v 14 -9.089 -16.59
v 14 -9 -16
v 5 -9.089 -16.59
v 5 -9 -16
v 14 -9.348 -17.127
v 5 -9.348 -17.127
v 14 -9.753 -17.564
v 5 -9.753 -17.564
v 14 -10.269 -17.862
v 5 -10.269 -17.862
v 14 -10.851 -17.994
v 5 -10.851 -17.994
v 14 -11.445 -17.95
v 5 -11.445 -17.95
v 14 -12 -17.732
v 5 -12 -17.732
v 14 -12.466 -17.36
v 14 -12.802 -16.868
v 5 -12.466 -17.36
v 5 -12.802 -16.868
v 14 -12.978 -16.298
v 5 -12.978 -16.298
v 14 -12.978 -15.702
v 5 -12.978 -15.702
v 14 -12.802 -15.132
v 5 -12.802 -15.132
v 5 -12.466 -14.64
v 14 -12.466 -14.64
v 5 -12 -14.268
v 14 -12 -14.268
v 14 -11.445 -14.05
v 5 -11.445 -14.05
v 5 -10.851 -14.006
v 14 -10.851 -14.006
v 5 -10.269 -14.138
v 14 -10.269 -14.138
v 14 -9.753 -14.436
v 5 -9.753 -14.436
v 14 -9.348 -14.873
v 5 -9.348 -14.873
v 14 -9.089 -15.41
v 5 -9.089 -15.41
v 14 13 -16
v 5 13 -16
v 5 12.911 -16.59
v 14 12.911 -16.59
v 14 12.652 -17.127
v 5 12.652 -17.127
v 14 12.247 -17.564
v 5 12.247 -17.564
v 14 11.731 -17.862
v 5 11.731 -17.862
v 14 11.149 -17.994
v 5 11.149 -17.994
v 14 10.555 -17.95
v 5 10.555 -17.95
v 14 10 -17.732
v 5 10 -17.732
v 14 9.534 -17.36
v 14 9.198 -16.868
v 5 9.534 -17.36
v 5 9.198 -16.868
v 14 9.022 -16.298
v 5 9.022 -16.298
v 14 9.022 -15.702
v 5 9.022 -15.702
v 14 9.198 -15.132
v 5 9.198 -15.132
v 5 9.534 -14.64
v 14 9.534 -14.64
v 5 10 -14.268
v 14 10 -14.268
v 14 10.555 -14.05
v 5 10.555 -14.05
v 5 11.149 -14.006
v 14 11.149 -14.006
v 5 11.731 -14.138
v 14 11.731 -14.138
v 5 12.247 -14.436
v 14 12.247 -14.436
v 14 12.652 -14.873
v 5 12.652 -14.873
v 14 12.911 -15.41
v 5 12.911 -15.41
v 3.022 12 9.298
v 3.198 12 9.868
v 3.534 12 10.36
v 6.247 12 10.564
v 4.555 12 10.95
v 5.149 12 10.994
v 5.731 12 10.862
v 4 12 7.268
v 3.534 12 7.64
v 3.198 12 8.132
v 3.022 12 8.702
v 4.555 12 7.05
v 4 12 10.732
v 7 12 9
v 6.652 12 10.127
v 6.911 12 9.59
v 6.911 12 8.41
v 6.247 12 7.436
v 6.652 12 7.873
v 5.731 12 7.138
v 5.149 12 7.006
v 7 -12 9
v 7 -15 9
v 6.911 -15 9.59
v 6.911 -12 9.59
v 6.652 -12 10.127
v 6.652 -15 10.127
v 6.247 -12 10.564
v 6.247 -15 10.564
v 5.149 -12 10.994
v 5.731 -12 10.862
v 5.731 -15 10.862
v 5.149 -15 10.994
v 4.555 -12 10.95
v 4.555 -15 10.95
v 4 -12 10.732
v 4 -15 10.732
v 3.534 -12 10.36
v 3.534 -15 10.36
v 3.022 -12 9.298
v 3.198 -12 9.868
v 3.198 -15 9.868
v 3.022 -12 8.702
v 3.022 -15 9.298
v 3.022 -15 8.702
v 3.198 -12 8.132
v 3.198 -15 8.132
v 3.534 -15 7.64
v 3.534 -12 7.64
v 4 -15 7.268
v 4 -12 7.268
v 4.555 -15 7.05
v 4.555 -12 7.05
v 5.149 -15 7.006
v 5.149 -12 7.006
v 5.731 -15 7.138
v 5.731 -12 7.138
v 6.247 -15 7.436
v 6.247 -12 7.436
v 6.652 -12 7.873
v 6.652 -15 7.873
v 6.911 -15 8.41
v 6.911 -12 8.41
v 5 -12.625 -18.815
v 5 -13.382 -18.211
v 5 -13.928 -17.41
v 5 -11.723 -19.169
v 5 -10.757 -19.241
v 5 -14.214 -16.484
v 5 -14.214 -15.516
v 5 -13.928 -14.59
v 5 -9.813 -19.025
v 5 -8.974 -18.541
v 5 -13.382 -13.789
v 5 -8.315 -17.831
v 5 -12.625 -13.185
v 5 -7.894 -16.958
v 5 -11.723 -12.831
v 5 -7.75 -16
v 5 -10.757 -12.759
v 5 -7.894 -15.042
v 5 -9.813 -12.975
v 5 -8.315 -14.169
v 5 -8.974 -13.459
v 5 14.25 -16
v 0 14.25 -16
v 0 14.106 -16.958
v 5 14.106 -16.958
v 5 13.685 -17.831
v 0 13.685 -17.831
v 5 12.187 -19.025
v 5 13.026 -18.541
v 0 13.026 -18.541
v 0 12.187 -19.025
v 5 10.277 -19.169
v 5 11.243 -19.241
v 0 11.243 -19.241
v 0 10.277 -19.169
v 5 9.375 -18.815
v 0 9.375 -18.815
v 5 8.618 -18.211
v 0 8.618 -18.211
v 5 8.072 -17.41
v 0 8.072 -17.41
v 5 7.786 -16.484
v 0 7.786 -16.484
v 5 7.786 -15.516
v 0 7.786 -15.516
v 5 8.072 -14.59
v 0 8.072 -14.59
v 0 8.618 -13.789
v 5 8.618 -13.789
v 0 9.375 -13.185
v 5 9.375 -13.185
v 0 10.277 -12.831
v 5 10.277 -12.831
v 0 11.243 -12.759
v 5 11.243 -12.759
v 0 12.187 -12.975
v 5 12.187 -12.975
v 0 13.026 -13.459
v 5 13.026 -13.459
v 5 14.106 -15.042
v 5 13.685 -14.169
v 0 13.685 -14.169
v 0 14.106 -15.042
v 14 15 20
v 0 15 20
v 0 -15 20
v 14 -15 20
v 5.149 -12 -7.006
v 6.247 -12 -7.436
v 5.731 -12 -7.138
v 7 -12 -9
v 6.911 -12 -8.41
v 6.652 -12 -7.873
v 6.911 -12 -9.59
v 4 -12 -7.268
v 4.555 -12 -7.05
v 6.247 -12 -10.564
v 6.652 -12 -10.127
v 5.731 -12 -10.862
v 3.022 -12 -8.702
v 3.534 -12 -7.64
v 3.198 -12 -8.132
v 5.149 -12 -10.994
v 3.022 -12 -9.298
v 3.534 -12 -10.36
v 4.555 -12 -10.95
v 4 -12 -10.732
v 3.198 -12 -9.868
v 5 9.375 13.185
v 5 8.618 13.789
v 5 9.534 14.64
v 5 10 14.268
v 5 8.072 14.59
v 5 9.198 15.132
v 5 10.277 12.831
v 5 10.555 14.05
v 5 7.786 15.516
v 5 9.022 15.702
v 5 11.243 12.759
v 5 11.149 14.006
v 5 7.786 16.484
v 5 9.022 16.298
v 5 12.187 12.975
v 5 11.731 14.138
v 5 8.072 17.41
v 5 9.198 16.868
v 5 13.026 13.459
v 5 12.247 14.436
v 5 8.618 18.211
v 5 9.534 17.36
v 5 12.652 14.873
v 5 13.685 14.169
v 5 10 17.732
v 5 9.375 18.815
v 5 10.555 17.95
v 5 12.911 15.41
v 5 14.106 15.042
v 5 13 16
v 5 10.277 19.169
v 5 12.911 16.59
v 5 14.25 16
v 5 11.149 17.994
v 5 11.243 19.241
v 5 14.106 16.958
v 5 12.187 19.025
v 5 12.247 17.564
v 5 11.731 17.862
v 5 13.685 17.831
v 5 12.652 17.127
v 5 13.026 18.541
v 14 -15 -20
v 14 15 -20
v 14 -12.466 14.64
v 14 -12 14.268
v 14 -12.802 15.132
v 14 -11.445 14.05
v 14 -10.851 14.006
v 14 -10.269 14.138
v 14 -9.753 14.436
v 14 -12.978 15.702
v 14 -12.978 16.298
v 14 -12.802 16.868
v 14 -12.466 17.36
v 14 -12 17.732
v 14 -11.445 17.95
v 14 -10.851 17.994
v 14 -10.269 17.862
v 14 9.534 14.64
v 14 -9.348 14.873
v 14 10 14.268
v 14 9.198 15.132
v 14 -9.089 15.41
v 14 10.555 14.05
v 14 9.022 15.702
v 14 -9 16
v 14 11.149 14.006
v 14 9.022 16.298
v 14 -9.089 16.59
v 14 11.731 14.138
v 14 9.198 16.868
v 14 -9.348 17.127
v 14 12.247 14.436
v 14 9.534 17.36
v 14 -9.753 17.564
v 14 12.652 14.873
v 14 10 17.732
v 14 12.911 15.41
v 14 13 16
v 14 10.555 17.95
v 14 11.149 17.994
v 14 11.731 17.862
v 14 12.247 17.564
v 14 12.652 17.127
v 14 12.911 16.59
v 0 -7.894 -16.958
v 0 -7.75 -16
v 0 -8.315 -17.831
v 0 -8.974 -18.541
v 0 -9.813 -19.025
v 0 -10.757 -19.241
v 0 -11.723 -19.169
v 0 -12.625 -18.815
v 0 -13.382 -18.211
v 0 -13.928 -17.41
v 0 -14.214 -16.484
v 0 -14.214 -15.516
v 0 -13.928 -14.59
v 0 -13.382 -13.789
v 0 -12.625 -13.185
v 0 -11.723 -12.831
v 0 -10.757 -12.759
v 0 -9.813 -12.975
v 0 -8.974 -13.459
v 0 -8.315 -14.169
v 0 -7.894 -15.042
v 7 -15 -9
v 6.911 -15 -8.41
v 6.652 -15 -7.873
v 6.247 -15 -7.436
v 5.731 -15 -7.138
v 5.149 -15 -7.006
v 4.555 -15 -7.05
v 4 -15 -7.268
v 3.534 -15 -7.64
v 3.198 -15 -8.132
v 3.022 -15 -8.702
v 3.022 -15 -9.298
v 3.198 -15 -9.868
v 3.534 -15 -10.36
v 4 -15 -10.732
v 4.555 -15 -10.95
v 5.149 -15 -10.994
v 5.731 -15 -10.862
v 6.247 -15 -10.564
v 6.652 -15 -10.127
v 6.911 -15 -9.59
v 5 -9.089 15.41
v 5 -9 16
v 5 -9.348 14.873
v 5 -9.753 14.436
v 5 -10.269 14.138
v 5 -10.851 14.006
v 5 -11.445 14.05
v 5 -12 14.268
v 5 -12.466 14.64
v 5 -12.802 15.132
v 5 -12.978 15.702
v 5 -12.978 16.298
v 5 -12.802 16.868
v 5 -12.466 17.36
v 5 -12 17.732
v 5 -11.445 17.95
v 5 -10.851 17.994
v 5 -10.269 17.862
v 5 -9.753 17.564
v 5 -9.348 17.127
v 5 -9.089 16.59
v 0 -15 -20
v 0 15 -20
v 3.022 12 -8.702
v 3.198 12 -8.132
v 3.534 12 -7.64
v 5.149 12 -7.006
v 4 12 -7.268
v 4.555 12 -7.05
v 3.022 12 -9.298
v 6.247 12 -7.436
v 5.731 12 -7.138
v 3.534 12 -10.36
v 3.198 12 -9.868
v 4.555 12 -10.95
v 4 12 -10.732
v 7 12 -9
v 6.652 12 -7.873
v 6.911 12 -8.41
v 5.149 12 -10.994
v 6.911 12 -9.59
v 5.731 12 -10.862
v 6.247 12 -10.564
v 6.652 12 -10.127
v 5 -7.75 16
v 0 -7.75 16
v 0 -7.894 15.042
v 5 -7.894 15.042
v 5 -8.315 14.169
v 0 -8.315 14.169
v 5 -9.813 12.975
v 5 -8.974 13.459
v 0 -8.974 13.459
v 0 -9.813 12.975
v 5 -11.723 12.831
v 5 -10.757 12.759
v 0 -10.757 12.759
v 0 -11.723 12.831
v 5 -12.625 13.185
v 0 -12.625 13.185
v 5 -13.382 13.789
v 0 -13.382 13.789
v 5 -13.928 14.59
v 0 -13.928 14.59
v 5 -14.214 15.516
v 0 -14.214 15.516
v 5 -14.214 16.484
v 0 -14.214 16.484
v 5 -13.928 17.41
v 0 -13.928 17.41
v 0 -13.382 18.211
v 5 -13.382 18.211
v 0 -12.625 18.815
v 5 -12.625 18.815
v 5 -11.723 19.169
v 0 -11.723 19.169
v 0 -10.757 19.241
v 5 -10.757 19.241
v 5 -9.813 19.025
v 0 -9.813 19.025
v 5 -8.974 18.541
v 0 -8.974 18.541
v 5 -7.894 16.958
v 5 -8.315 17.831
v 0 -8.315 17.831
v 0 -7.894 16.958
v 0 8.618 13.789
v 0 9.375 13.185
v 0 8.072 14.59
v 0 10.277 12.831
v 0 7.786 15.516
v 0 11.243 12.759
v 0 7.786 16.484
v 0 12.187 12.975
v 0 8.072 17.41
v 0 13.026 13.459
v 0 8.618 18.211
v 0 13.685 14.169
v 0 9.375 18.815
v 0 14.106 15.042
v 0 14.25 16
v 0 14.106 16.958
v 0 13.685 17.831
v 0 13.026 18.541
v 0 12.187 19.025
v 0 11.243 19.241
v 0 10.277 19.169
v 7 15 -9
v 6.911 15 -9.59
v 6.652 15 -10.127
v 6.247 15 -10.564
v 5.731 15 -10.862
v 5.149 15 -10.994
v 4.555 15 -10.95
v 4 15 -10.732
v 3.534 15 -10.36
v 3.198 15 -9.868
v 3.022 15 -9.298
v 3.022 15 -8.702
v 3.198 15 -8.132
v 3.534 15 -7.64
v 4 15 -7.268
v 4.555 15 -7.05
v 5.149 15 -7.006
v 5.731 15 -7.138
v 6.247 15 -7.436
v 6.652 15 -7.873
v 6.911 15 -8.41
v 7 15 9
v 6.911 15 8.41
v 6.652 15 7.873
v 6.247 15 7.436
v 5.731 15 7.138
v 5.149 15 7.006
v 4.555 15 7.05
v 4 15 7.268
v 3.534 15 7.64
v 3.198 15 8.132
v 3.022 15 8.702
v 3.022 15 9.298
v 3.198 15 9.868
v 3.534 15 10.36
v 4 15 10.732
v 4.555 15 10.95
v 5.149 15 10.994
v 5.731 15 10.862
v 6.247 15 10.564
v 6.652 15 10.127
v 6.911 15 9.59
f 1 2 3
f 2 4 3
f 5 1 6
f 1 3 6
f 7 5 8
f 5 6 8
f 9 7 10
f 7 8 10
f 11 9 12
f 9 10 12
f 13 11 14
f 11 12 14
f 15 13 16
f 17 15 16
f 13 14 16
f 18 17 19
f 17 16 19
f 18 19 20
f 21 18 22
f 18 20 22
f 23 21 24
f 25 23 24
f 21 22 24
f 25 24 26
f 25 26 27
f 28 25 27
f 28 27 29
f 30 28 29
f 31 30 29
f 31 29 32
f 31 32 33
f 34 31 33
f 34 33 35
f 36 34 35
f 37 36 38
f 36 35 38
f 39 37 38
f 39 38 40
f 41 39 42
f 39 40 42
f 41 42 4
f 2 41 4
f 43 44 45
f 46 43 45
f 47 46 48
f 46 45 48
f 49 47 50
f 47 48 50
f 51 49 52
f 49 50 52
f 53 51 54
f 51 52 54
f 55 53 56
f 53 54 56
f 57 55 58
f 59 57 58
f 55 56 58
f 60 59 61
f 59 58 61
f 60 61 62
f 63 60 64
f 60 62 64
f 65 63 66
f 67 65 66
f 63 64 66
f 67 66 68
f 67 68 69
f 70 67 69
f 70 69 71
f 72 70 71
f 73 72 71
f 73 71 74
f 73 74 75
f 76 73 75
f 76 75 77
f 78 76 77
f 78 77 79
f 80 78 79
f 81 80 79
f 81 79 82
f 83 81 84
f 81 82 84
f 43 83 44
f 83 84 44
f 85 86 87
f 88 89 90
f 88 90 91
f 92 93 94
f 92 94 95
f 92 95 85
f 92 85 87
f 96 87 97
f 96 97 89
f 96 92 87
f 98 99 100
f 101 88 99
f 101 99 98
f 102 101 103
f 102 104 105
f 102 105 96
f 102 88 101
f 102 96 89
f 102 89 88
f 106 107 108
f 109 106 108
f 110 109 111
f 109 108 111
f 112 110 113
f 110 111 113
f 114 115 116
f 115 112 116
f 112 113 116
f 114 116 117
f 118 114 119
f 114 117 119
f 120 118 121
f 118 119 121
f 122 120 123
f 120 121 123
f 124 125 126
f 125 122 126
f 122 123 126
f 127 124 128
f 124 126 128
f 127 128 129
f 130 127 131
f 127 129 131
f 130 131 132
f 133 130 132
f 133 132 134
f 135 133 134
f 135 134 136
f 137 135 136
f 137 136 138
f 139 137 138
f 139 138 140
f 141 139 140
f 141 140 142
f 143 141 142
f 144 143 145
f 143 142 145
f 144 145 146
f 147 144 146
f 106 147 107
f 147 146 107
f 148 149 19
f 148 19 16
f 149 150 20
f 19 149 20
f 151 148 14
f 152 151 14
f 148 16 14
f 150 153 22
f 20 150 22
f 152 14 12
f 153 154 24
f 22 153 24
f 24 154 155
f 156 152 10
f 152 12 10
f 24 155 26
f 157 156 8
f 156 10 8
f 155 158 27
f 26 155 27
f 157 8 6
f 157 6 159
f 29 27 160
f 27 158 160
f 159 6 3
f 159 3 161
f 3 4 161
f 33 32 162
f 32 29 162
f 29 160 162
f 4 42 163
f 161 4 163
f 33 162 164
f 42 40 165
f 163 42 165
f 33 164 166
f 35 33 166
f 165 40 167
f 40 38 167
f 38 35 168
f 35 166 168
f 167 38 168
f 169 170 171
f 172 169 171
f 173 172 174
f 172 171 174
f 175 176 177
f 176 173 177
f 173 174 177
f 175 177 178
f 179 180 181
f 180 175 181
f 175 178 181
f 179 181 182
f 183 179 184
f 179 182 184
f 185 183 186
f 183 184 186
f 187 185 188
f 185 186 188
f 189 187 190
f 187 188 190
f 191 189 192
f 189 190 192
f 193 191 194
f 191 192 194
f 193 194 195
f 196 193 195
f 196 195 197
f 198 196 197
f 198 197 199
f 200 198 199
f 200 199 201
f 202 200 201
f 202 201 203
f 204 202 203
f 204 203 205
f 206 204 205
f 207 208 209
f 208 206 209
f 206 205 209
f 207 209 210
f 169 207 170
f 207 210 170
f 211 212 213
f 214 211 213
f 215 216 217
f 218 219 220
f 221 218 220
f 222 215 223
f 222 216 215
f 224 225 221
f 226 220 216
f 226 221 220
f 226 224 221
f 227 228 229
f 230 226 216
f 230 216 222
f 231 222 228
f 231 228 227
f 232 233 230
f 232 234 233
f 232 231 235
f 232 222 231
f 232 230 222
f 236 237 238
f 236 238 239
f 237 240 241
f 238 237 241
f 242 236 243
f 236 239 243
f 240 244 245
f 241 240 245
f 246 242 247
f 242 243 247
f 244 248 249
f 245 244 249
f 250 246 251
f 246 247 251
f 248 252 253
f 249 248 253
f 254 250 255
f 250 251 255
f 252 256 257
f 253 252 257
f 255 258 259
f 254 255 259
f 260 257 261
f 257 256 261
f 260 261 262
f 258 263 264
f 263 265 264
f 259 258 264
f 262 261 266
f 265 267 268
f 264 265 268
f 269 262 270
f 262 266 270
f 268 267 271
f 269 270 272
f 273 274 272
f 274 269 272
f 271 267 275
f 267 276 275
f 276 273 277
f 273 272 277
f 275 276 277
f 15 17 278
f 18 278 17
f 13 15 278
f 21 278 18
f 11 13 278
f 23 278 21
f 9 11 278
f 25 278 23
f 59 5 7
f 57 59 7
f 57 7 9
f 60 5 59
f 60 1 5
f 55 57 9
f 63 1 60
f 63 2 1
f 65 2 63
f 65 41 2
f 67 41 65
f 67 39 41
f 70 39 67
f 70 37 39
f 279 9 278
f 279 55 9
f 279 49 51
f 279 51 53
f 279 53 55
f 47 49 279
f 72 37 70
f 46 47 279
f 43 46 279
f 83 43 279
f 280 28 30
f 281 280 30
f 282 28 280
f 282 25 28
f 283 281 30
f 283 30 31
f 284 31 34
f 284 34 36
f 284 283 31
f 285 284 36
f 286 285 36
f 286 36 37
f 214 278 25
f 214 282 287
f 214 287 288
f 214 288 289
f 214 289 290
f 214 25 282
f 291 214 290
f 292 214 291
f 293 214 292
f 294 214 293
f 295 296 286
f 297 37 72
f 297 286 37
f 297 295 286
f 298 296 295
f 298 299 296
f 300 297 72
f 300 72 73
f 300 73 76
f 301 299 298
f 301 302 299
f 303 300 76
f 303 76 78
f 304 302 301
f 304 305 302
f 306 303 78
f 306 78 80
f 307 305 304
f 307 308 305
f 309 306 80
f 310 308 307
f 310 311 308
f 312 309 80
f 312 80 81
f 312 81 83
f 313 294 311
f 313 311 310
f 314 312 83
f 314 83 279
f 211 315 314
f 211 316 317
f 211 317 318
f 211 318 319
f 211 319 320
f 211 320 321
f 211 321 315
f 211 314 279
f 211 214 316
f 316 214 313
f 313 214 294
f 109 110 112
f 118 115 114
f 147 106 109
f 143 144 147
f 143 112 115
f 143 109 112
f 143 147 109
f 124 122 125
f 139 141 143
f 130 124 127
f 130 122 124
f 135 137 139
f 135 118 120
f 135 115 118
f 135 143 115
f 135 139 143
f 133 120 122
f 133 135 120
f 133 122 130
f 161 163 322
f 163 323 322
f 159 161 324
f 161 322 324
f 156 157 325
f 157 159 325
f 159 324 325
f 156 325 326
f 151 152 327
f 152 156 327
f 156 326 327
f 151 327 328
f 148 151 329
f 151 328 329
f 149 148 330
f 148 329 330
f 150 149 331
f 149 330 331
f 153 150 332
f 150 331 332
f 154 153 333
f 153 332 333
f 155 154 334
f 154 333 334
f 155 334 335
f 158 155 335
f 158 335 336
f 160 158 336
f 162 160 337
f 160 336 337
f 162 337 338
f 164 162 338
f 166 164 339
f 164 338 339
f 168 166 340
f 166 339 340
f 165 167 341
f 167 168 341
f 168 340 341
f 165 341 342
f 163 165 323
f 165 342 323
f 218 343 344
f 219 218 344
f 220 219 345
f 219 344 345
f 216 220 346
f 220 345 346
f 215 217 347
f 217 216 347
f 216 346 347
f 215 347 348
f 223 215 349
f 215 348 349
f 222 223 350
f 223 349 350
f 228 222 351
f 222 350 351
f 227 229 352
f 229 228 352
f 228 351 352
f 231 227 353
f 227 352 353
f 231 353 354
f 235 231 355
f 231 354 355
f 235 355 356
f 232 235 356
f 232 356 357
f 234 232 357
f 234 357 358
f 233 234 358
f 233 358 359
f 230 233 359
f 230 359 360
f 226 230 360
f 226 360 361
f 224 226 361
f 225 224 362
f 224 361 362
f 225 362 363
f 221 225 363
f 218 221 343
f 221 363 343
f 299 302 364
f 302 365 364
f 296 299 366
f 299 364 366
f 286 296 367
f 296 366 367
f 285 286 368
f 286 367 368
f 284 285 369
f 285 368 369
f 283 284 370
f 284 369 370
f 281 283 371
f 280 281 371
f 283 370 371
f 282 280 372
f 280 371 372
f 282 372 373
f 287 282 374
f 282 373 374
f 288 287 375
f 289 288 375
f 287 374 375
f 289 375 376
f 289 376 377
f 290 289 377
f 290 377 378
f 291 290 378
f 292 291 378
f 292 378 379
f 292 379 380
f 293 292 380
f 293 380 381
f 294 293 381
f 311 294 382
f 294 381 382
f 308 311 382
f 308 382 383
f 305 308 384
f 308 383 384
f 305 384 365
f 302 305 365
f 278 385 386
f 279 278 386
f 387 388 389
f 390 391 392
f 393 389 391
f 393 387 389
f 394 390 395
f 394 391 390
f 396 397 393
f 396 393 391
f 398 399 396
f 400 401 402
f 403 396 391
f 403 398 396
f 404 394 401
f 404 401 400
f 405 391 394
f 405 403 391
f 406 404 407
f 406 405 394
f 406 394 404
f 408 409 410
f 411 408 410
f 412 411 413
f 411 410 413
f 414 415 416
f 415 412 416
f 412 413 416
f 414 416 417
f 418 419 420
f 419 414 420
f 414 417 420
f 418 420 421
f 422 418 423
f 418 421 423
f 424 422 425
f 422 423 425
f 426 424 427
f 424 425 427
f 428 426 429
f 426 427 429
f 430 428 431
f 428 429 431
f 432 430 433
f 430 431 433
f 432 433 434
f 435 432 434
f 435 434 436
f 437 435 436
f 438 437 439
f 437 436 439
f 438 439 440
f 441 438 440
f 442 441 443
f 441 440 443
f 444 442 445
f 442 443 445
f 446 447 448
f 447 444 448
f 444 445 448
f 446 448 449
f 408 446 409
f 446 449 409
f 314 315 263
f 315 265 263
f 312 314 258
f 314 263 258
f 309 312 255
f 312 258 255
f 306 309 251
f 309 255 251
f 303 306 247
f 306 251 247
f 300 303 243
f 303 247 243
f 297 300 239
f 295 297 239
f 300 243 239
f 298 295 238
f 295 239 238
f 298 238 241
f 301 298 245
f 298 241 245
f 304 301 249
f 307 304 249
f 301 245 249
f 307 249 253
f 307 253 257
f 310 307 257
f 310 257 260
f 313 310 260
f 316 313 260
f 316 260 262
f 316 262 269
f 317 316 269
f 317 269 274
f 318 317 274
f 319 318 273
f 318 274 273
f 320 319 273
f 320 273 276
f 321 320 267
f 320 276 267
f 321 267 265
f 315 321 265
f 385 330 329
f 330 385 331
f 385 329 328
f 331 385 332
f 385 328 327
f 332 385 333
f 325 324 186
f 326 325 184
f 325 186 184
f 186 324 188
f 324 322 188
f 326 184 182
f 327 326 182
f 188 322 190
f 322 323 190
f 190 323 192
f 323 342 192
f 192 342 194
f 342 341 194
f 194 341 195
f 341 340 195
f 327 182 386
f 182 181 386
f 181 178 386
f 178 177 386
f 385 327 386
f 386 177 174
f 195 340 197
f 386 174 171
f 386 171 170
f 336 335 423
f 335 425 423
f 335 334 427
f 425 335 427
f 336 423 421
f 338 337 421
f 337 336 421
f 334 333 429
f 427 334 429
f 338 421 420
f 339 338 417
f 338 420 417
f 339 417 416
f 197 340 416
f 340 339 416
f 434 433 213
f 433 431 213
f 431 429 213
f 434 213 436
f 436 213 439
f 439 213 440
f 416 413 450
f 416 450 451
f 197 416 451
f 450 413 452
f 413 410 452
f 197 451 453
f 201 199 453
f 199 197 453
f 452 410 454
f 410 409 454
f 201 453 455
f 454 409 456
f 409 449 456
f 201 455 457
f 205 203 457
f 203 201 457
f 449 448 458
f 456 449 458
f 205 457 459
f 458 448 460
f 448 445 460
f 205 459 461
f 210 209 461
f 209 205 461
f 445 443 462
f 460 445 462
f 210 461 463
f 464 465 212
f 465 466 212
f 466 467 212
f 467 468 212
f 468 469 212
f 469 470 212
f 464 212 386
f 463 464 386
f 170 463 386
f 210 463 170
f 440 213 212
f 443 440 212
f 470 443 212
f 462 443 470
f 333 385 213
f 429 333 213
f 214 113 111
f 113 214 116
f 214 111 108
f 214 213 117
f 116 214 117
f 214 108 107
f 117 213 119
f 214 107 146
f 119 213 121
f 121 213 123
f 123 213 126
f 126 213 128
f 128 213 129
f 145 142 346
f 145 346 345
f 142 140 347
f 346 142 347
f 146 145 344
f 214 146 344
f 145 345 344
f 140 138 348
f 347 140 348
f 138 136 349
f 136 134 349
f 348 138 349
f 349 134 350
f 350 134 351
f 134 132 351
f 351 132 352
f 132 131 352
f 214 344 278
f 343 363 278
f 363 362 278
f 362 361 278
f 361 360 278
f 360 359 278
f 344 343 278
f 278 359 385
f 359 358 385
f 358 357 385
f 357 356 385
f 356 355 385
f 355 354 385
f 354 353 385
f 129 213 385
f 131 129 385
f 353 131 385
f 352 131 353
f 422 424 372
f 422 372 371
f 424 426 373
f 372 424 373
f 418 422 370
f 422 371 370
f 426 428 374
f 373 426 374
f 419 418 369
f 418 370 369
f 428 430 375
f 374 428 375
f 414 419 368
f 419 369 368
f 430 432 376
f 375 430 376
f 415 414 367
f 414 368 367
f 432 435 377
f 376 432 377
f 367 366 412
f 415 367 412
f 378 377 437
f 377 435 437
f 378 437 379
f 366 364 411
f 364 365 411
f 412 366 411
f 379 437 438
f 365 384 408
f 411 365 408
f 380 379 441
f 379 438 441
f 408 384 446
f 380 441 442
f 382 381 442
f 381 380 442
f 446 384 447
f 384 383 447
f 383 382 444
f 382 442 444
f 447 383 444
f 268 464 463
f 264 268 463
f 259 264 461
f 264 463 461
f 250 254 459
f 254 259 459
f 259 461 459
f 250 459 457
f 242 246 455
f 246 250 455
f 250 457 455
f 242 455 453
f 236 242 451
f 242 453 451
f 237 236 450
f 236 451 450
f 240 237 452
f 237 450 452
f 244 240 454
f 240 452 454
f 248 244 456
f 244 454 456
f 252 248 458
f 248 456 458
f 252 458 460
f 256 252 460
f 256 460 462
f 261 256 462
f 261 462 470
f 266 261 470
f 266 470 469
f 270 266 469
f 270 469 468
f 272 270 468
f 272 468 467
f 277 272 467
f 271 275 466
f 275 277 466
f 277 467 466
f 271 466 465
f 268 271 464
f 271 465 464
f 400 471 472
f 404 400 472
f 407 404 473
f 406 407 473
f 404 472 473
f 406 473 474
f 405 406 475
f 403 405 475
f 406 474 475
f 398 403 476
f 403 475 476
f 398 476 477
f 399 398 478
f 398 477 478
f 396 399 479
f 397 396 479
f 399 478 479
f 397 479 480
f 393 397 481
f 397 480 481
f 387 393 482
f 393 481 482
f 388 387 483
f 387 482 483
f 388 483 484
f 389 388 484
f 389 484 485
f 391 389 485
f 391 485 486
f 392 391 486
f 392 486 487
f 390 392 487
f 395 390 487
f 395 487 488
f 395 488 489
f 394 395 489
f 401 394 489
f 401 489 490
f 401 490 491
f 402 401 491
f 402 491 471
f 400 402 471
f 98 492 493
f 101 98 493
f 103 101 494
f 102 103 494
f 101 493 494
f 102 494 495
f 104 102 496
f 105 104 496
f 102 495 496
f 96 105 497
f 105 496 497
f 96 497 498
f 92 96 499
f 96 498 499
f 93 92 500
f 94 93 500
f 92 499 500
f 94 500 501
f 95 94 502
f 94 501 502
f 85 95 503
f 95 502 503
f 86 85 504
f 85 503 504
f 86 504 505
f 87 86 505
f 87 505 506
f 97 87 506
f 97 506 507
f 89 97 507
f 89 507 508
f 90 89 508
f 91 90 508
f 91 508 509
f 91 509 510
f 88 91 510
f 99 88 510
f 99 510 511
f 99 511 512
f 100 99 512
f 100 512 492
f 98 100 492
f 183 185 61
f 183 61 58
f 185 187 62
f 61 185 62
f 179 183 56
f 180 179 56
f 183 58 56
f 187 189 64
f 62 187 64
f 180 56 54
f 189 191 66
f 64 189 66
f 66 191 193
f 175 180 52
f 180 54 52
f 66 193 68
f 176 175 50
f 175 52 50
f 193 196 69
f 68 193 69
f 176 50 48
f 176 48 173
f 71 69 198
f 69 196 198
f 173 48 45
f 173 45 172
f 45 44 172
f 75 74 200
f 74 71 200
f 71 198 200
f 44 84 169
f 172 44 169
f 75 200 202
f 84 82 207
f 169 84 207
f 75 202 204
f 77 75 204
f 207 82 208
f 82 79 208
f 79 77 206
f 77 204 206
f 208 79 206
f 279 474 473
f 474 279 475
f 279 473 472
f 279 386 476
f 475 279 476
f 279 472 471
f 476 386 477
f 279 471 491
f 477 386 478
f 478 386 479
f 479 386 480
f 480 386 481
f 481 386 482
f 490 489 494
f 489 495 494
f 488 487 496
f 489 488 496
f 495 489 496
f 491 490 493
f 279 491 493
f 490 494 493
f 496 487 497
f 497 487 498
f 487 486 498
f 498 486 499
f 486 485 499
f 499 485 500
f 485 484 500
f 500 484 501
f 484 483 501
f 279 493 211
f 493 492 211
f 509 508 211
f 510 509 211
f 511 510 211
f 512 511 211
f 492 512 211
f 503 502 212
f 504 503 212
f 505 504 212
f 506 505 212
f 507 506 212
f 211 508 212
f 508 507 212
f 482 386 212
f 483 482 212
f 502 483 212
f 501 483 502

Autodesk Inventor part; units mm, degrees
ref_plane "YZ Plane" through (0, 0, 0) normal (1, 0, 0) x (0, 1, 0)
ref_plane "XZ Plane" through (0, 0, 0) normal (0, 1, 0) x (-1, 0, 0)
ref_plane "XY Plane" through (0, 0, 0) normal (0, 0, 1) x (1, 0, 0)
sketch "Sketch1" plane through (0, 0, 0) normal (1, 0, 0) x (0, 1, 0)
  line L0 (-15, -20) -> (15, -20)
  line L1 (15, -20) -> (15, 20)
  line L2 (15, 20) -> (-15, 20)
  line L3 (-15, 20) -> (-15, -20)
  line L4 (-15, -20) -> (15, 20) construction
  line L5 (15, -20) -> (-15, 20) construction
  line L6 (-7, -20) -> (7, -20)
  line L7 (7, -20) -> (7, 20)
  line L8 (7, 20) -> (-7, 20)
  line L9 (-7, 20) -> (-7, -20)
  line L10 (7, -20) -> (5.4606, -20)
  arc A0 (-5.3073, 19.4579) -> (-4.85, 20) centre (-5.4, 20) ccw
  arc A1 (-4.85, 18) -> (-5.3073, 18.5421) centre (-5.4, 18) ccw
  line L11 (-5.4, 20) -> (-5.4, 18) construction
  line L12 (-6, 19.1286) -> (-6, 18.8714)
  line L13 (-5.7921, 19.375) -> (-5.3073, 19.4579)
  line L14 (-5.3073, 18.5421) -> (-5.7921, 18.625)
  arc A2 (-5.7921, 19.375) -> (-6, 19.1286) centre (-5.75, 19.1286) ccw
  arc A3 (-6, 18.8714) -> (-5.7921, 18.625) centre (-5.75, 18.8714) ccw
  line L15 (-5.4, 18) -> (-4.85, 18) construction
  line L16 (-6, 19) -> (-5.4, 19) construction
  line L17 (-4.85, 18) -> (-1.85, 18)
  line L18 (-1.85, 18) -> (-1.85, 20)
  line L19 (7, -20) -> (-7, 20) construction
  line L20 (7, 20) -> (-7, -20) construction
  line L21 (7, 20) -> (15, 20)
  line L22 (15, 20) -> (15, -20)
  line L23 (15, -20) -> (7, -20)
  line L24 (-7, 20) -> (-15, 20)
  line L25 (-15, 20) -> (-15, -20)
  line L26 (-15, -20) -> (-7, -20)
  circle A4 centre (11, 16) radius 2
  circle A5 centre (11, -16) radius 2
  circle A6 centre (-11, 16) radius 2
  circle A7 centre (-11, -16) radius 2
  circle A8 centre (11, -16) radius 3.25
  circle A9 centre (11, 16) radius 3.25
  circle A10 centre (-11, 16) radius 3.25
  circle A11 centre (-11, -16) radius 3.25
  point P0 (0, 0)
  point P1 (0, 0)
  point P2 (5.4606, -20)
  point P3 (11, 20)
  point P4 (-11, 20)
  dimension "d0" = 40
  dimension "d1" = 30
  dimension "d12" = 14
  dimension "d13" = 1.1
  dimension "d14" = 1.6
  dimension "d15" = 1.1
  dimension "d16" = 2
  dimension "d17" = 1
  dimension "d18" = 0.25
  dimension "d19" = 0.75
  dimension "d20" = 3
  dimension "d21" = 40
  dimension "d22" = 30
  dimension "d23" = 4
  dimension "d24" = 4
  dimension "d25" = 4
  dimension "d26" = 4
  dimension "d27" = 4
  dimension "d28" = 4
  dimension "d29" = 4
  dimension "d30" = 4
  dimension "d31" = 4
  dimension "d32" = 4
  dimension "d33" = 4
  dimension "d34" = 4
  dimension "d37" = 6.5
  dimension "d38" = 6.5
  dimension "d39" = 6.5
  dimension "d40" = 6.5
extrude "Extrusion1" add sketch "Sketch1" along normal blind 14 contours L3 L2 L9 L0 | L9 L2 A0 L13 A2 L12 A3 L14 A1 L17 L18 L7 L0 | L7 L2 L1 L0 | L2 L18 L17 A1 L14 A3 L12 A2 L13 A0 | A4 | A5 | A6 | A7 | A8 | A9 | A10 | A11
sketch "Sketch2" plane through (0, 15, 20) normal (0, 1, 0) x (1, 0, 0)
  line L0 (0, 40) -> (0, 0) construction
  line L1 (0, 11) -> (5, 11) construction
  line L2 (0, 29) -> (5, 29) construction
  circle A0 centre (5, 11) radius 2
  circle A1 centre (5, 29) radius 2
  line L3 (0, 0) -> (14, 0) projected
  point P0 (0, 20)
  dimension "d4" = 5
  dimension "d5" = 5
  dimension "d6" = 4
  dimension "d7" = 4
  dimension "d8" = 18
  dimension "d9" = 11
extrude "Extrusion2" cut sketch "Sketch2" against normal blind 3
mirror "Mirror1" about plane through (0, 0, 0) normal (0, 1, 0) of "Extrusion2"
extrude "Extrusion3" cut sketch "Sketch1" along normal through all contours A4 | A5 | A6 | A7
extrude "Extrusion4" cut sketch "Sketch1" along normal blind 5 contours A8 | A9 | A10 | A11
equation "\"d27\" = d26"
equation "\"d30\" = d27"
equation "\"d31\" = d25"
equation "\"d32\" = d23"
equation "\"d33\" = d26"
equation "\"d34\" = d23"
equation "\"d38\" = d37"
equation "\"d39\" = d37"
equation "\"d40\" = d37"
equation "\"d5\" = d4"
properties part number "LRT_Face"
